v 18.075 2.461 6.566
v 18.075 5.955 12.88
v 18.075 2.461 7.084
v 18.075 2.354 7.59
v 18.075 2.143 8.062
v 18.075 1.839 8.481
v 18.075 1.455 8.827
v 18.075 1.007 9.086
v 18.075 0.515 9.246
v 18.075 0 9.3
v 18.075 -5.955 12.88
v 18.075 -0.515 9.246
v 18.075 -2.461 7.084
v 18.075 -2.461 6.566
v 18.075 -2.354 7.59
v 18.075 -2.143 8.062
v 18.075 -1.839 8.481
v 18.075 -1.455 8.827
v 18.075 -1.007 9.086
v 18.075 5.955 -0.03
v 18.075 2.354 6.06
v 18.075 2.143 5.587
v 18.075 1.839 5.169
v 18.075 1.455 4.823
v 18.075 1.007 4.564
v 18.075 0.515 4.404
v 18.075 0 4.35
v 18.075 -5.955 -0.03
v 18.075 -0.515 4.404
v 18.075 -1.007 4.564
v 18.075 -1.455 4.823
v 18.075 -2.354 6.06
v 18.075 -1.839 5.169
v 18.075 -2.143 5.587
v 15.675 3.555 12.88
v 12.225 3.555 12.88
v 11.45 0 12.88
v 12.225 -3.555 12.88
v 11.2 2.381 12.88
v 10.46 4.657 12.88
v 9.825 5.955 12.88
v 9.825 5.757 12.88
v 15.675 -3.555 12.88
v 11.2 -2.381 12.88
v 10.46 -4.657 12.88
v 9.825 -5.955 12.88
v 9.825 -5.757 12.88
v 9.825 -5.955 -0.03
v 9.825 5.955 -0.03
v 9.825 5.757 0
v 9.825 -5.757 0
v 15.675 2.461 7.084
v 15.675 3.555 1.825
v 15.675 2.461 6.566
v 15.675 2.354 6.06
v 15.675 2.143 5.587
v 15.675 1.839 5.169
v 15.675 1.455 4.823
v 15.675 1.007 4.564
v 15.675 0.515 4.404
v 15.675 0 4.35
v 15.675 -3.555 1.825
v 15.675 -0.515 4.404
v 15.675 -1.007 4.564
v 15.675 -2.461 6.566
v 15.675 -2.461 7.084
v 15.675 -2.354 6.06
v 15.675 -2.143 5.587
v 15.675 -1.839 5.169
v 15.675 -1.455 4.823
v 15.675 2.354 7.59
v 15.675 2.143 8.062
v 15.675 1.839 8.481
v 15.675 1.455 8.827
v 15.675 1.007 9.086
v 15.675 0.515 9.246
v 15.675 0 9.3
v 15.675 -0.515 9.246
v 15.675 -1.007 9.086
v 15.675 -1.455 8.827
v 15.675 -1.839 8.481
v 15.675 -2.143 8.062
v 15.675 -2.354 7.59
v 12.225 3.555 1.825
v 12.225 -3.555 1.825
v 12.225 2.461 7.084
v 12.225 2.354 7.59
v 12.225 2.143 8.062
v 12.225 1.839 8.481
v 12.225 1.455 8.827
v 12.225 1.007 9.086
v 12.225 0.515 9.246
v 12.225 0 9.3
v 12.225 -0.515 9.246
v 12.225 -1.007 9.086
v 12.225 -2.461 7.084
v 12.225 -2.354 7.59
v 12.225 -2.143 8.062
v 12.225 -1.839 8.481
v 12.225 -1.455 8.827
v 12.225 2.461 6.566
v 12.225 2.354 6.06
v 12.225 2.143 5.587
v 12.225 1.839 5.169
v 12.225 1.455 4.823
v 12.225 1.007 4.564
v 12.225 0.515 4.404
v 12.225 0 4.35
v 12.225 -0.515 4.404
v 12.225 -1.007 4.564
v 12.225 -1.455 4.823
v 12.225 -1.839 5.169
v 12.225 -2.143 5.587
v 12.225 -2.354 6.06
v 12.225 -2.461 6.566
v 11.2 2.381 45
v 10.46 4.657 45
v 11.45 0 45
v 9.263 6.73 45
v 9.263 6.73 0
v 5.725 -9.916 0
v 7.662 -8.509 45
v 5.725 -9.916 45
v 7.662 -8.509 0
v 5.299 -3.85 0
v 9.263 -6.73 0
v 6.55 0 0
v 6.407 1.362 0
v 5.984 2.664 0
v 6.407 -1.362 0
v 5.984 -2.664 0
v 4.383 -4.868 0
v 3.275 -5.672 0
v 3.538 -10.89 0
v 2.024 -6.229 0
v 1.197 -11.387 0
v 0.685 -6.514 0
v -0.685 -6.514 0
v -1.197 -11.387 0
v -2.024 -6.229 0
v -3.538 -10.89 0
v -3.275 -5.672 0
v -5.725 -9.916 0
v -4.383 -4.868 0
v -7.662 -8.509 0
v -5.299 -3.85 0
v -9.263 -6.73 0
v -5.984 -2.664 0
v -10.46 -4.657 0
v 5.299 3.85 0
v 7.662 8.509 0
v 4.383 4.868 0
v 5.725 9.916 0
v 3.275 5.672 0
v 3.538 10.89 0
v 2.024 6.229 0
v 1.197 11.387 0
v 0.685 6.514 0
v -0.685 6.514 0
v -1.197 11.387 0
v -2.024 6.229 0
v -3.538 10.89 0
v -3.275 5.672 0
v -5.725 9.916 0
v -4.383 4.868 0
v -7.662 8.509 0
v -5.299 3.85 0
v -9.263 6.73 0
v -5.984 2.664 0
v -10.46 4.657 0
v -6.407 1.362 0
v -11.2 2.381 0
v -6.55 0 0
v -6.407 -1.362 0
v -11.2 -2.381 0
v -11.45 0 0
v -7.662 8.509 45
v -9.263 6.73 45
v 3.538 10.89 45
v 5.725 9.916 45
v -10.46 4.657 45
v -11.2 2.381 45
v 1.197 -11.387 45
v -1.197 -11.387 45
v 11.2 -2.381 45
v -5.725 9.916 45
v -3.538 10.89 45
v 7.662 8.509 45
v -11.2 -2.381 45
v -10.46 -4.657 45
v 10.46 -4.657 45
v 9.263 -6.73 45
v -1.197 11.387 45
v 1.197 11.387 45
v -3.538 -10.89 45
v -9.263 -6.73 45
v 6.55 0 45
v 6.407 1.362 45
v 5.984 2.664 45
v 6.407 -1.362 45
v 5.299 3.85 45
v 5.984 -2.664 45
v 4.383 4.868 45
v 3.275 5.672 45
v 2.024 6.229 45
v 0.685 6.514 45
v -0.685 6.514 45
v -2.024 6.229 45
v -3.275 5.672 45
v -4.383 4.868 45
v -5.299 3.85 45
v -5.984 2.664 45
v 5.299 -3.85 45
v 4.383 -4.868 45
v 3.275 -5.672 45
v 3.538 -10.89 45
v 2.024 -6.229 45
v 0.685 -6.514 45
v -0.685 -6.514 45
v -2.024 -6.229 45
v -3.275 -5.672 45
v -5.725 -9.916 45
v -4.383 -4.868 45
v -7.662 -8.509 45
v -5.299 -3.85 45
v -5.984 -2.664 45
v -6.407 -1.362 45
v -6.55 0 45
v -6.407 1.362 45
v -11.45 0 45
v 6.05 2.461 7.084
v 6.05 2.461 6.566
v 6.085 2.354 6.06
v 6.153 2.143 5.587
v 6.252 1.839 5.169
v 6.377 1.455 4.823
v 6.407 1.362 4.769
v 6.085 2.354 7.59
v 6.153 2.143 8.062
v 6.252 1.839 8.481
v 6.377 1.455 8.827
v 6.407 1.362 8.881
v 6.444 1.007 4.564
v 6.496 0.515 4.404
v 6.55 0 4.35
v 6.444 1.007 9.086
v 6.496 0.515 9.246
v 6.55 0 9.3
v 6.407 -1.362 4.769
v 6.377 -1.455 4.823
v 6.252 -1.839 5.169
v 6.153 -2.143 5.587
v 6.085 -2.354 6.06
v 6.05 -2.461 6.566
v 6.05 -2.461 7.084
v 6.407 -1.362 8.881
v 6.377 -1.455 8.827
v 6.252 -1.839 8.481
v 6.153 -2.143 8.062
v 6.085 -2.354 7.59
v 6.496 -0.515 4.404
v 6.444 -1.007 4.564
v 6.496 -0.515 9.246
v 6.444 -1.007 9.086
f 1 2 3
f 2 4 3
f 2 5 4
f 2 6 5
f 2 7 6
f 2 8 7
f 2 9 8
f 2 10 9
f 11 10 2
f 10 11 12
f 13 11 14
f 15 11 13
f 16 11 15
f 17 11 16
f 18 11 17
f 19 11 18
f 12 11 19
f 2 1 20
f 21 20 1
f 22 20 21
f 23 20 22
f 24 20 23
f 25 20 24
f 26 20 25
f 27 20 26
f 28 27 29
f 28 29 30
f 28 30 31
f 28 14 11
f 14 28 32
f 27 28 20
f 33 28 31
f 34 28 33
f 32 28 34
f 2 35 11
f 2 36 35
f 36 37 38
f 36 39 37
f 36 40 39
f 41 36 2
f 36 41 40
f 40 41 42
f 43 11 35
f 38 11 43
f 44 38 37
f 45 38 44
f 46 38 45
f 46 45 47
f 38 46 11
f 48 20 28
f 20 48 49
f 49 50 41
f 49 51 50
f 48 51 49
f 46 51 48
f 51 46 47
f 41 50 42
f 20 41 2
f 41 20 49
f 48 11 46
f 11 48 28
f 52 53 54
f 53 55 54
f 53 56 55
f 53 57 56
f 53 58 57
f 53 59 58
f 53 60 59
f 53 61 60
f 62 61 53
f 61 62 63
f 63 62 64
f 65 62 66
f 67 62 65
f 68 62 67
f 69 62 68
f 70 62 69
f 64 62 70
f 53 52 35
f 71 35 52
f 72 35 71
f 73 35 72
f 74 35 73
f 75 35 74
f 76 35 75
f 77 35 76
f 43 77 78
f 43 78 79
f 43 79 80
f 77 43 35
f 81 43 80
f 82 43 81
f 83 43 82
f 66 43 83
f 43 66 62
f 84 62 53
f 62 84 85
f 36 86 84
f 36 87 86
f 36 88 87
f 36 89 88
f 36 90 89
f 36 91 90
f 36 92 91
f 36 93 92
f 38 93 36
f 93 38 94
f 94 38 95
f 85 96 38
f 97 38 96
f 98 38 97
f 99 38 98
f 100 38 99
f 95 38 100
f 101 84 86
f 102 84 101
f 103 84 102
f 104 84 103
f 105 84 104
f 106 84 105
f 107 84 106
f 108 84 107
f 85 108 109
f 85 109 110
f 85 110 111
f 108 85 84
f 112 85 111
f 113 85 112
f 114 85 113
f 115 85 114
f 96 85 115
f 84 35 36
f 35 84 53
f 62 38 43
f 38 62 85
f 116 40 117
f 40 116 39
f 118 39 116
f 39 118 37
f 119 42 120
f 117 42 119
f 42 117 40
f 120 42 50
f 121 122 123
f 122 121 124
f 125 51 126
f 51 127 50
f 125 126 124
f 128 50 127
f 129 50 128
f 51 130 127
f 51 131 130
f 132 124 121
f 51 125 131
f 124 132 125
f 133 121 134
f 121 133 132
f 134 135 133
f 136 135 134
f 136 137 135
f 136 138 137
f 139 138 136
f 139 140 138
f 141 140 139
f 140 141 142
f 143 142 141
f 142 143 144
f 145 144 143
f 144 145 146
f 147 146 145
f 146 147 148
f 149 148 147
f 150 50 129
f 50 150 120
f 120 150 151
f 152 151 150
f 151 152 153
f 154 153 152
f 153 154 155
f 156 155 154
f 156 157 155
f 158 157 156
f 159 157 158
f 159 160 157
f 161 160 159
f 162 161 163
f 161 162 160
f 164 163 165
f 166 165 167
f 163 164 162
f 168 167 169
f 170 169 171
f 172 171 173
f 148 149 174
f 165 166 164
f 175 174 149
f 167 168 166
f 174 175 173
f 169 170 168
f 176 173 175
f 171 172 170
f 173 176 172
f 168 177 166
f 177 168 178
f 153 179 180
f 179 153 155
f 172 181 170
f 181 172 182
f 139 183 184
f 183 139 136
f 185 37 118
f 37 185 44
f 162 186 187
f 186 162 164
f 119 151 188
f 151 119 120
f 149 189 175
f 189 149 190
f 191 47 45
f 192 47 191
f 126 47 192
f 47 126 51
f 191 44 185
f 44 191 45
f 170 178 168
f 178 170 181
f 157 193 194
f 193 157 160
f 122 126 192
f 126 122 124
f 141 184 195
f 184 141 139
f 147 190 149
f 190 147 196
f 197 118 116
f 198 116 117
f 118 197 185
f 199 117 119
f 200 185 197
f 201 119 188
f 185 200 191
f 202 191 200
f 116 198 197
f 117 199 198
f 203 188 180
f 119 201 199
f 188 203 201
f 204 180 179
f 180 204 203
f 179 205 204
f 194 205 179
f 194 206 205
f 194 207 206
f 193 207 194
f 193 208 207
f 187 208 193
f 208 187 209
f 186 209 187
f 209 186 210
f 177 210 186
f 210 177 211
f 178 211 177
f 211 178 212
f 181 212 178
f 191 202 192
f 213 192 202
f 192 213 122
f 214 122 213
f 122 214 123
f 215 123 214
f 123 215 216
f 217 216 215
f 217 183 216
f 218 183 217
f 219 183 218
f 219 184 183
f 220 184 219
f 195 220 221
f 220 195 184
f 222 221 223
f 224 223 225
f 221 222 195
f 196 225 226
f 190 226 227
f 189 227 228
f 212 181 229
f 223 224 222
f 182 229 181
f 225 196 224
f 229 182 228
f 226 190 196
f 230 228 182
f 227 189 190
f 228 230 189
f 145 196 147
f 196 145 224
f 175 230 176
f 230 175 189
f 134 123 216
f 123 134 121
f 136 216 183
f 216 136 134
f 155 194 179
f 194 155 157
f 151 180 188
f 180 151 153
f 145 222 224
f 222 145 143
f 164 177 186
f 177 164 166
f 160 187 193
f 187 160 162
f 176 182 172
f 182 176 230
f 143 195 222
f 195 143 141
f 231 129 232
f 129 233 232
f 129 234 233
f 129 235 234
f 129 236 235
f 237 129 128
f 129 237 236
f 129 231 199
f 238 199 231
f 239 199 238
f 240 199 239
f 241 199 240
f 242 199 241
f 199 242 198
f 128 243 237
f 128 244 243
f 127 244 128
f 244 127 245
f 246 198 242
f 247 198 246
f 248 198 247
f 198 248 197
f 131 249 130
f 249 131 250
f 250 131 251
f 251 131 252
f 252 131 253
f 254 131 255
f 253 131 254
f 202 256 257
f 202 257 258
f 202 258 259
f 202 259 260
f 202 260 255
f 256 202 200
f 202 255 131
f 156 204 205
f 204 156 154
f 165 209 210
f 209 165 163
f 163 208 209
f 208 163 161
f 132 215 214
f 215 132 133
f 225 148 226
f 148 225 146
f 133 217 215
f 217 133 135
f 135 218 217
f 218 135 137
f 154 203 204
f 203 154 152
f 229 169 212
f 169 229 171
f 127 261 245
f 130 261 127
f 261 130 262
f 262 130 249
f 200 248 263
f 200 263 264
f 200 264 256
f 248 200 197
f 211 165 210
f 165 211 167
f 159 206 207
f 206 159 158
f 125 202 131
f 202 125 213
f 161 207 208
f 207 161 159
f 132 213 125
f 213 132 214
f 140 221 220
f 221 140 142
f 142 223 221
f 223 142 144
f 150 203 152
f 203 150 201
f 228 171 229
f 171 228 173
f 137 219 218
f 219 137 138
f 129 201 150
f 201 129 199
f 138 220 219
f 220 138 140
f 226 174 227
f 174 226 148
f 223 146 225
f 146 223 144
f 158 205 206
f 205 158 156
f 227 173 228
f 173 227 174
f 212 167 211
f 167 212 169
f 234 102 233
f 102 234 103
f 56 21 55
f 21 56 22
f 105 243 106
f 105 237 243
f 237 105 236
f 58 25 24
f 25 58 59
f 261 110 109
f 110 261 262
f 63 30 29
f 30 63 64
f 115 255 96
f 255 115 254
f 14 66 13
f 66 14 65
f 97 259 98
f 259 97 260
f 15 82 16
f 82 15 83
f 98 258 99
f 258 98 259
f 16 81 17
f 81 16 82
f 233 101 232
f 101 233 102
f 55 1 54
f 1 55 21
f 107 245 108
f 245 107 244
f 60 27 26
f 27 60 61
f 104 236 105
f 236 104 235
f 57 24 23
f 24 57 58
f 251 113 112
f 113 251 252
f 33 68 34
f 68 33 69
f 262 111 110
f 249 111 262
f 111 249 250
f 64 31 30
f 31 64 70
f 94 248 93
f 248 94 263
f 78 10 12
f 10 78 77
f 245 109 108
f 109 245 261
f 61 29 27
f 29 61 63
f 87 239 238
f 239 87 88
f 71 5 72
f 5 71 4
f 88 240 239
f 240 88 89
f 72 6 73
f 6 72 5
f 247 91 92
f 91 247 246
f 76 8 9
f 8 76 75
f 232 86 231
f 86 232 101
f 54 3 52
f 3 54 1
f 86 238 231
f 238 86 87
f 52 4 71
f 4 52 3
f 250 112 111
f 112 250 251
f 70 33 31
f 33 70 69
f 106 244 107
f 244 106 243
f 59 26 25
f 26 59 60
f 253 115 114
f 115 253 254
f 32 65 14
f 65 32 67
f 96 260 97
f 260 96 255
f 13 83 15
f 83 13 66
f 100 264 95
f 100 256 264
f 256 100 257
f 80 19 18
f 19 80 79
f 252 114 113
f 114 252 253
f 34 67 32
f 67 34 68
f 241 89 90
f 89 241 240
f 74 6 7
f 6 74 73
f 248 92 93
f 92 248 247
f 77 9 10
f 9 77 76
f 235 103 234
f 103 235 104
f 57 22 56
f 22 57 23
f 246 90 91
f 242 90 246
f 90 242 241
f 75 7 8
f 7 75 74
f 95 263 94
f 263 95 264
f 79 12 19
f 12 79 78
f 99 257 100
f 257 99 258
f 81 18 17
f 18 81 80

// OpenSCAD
poleDia = 12.9;
poleHei = 45;
tol = 0.1;

screwDia=3.95;
nutDia = 6.91;
nutHei = 3.25;

$fn=30;

module nutpocket(){
    difference(){
        cube([nutHei+5,nutDia+5,nutDia+6],center=true);
        union(){
            translate([0,0,nutDia/2-2.5]){
                //rotate([0,90,0]){
                    //translate([0,0,-10]){
                        //cylinder(d=screwDia+2*tol,h=nutHei+20);
                        //}//end translate
                //}//end rotate
                cube([nutHei+2*tol,nutDia+2*tol,nutDia+4+2*tol],center=true);
                }//end translate
            }//end union
        }//end differece
    }//end module
    
module poleFit(){
    difference(){
    union(){
    cylinder(d=poleDia+10,h=poleHei);
    translate([(poleDia+10)/2+2.5,0,(nutHei+10)/2-2*tol]){
        nutpocket();
    }//end translate
}//end union
        translate([0,0,-1]){
        cylinder(d=poleDia+2*tol,h=poleHei+5);
        }//end translate
    translate([0,0,(nutHei+10)/2+2*tol]){
        rotate([0,90,0]){
        cylinder(d=screwDia+1,h=poleDia+10);
        }//end rotate
    }//end translate
    }//end difference

}//end module

poleFit();
